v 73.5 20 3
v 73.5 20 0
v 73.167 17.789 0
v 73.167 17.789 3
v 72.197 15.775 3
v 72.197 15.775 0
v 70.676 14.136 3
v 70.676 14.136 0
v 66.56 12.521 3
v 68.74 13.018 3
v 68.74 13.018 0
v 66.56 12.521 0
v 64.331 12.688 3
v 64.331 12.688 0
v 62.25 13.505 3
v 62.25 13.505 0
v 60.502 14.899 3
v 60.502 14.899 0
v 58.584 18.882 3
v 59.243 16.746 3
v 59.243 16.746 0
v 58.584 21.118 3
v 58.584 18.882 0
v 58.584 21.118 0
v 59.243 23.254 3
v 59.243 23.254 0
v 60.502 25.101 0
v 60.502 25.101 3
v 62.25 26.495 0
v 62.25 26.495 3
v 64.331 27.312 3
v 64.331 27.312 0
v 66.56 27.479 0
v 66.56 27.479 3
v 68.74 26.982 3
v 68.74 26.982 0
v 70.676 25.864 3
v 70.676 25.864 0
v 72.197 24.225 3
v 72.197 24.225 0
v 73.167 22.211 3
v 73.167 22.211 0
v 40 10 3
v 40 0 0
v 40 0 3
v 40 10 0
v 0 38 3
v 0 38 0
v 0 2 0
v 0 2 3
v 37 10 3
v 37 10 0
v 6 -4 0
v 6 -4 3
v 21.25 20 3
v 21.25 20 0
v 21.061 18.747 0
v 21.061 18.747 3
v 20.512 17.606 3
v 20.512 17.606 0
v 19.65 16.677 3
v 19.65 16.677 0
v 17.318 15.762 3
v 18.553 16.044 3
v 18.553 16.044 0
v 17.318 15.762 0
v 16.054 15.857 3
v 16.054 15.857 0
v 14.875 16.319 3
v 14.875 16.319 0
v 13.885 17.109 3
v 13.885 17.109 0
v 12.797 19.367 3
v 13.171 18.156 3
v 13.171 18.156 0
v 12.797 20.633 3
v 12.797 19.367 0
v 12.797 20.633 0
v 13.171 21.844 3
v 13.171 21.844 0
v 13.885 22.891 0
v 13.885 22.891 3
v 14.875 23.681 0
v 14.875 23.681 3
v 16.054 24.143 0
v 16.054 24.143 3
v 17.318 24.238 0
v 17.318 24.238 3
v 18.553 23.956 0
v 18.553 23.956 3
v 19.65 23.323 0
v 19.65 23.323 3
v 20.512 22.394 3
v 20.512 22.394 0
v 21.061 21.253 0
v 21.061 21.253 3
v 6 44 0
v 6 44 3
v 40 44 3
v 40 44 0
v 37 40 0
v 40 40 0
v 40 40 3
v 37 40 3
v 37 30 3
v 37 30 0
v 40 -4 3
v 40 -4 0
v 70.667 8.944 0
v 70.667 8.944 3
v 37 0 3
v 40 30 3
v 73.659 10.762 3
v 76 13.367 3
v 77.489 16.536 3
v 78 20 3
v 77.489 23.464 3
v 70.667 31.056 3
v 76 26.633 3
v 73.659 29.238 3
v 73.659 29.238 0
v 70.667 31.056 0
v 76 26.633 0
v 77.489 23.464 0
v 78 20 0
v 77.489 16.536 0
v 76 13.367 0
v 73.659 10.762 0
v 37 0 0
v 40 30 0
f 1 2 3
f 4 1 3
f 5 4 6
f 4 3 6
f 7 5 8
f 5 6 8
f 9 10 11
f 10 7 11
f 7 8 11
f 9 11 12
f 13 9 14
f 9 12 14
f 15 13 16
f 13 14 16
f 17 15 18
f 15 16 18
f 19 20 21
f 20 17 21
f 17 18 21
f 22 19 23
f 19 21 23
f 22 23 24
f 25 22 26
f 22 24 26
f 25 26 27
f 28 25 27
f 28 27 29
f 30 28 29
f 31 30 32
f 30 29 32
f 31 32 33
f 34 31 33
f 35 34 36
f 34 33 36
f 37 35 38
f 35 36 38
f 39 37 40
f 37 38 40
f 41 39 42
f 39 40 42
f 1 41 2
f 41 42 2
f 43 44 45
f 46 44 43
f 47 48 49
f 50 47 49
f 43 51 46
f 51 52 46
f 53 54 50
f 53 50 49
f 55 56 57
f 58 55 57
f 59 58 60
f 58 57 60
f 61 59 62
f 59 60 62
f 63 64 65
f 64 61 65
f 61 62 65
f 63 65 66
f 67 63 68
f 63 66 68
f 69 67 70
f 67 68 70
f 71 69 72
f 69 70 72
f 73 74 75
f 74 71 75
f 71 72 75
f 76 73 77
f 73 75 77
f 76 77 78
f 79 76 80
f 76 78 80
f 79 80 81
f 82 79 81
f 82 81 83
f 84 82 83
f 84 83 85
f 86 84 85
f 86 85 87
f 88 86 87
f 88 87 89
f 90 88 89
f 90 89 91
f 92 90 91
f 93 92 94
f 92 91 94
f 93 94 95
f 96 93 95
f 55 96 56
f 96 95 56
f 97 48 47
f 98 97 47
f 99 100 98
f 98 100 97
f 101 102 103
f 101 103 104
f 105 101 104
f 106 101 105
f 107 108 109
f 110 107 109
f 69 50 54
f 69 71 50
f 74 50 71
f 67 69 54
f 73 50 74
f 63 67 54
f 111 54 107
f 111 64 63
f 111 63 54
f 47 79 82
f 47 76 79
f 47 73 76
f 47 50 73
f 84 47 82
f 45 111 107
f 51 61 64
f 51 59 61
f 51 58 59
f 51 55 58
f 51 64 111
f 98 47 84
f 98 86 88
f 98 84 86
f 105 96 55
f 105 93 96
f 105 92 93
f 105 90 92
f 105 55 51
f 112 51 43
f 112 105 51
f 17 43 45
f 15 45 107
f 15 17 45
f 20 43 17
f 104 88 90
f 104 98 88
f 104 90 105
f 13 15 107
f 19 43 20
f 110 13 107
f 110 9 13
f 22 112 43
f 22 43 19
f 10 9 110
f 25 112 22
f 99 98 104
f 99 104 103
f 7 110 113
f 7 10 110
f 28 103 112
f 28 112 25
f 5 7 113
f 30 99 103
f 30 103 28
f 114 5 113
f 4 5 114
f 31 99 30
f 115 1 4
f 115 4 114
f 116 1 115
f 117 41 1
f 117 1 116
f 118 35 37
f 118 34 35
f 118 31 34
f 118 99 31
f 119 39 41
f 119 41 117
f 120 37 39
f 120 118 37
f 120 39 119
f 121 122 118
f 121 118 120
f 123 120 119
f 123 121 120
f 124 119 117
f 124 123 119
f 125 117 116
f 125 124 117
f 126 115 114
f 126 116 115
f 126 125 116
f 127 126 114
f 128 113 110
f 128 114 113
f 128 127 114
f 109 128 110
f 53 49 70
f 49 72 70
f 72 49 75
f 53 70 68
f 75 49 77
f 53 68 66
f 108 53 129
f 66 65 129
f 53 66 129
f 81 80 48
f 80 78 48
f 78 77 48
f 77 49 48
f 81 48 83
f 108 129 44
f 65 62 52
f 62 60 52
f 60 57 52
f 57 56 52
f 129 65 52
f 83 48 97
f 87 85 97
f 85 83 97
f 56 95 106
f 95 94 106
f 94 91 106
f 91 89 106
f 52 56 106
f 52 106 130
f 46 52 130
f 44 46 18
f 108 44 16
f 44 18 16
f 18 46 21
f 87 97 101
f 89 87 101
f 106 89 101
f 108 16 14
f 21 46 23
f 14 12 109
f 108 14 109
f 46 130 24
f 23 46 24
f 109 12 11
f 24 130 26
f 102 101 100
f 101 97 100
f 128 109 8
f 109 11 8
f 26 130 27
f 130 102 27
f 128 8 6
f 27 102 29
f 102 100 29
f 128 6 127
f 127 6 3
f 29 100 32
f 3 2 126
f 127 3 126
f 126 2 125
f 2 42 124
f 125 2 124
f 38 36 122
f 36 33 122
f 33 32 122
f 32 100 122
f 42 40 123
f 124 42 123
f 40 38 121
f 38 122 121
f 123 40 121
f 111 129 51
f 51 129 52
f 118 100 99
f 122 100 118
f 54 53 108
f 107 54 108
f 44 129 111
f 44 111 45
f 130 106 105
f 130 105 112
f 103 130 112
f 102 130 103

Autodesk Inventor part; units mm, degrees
ref_plane "YZ Plane" through (0, 0, 0) normal (1, 0, 0) x (0, 1, 0)
ref_plane "XZ Plane" through (0, 0, 0) normal (0, 1, 0) x (-1, 0, 0)
ref_plane "XY Plane" through (0, 0, 0) normal (0, 0, 1) x (1, 0, 0)
sketch "Sketch1" plane through (0, 0, 0) normal (0, 0, 1) x (1, 0, 0)
  line L0 (0, 0) -> (40, 0)
  line L1 (40, 0) -> (40, 40)
  line L2 (40, 40) -> (0, 40)
  line L3 (0, 40) -> (0, 0)
  line L4 (40, 0) -> (37, 0)
  line L5 (37, 0) -> (37, 10)
  line L6 (37, 10) -> (40, 10)
  line L7 (40, 10) -> (40, 0)
  line L8 (40, 40) -> (37, 40)
  line L9 (37, 40) -> (37, 30)
  line L10 (37, 30) -> (40, 30)
  line L11 (40, 30) -> (40, 40)
  line L12 (0, -4) -> (40, -4)
  line L13 (40, -4) -> (40, 44)
  line L14 (40, 44) -> (0, 44)
  line L15 (0, 44) -> (0, -4)
  circle A0 centre (66, 20) radius 7.5
  circle A1 centre (66, 20) radius 12
  line L16 (40, -4) -> (70.6666, 8.9445)
  line L17 (40, 20) -> (43.7791, 20)
  line L18 (40, 44) -> (70.6666, 31.0555)
  circle A2 centre (17, 20) radius 4.25
  line L19 (37, 30) -> (37, 10)
  point P0 (20, 40)
  dimension "d0" = 40
  dimension "d1" = 40
  dimension "d2" = 3
  dimension "d3" = 10
  dimension "d4" = 10
  dimension "d5" = 4
  dimension "d6" = 4
  dimension "d7" = 15
  dimension "d8" = 24
  dimension "d9" = 26
  dimension "d11" = 8.5
  dimension "d17" = 20
  dimension "d18" = 20
extrude "Plate1" add sketch "Sketch1" along normal blind 3 contours L3 L2 L9 L19 L5 L0 | L0 L13 L12 L15 | L15 L14 L13 L2 | L1 L13 L18 A1 L16 | L19 L10 L1 L6 | A1
chamfer "Corner Chamfer1" distance 6 angle 45 2 edges at (0, 44, 1.5) (0, -4, 1.5)
equation "\"d6\" = d5"
equation "\"d10\" = Thickness"
equation "\"BendRadius\" = Thickness"
equation "\"BendReliefWidth\" = Thickness"
equation "\"BendReliefDepth\" = 0.5 * Thickness"
equation "\"CornerReliefSize\" = 4 * Thickness"
equation "\"MinimumRemnant\" = 2 * Thickness"
equation "\"TransitionRadius\" = BendRadius"
equation "\"JacobiRadiusSize\" = BendRadius"
equation "\"GapSize\" = Thickness"
equation "\"Thickness\" = 3"
properties part number "A_beam_piston_mount_2" material "Stainless Steel"
